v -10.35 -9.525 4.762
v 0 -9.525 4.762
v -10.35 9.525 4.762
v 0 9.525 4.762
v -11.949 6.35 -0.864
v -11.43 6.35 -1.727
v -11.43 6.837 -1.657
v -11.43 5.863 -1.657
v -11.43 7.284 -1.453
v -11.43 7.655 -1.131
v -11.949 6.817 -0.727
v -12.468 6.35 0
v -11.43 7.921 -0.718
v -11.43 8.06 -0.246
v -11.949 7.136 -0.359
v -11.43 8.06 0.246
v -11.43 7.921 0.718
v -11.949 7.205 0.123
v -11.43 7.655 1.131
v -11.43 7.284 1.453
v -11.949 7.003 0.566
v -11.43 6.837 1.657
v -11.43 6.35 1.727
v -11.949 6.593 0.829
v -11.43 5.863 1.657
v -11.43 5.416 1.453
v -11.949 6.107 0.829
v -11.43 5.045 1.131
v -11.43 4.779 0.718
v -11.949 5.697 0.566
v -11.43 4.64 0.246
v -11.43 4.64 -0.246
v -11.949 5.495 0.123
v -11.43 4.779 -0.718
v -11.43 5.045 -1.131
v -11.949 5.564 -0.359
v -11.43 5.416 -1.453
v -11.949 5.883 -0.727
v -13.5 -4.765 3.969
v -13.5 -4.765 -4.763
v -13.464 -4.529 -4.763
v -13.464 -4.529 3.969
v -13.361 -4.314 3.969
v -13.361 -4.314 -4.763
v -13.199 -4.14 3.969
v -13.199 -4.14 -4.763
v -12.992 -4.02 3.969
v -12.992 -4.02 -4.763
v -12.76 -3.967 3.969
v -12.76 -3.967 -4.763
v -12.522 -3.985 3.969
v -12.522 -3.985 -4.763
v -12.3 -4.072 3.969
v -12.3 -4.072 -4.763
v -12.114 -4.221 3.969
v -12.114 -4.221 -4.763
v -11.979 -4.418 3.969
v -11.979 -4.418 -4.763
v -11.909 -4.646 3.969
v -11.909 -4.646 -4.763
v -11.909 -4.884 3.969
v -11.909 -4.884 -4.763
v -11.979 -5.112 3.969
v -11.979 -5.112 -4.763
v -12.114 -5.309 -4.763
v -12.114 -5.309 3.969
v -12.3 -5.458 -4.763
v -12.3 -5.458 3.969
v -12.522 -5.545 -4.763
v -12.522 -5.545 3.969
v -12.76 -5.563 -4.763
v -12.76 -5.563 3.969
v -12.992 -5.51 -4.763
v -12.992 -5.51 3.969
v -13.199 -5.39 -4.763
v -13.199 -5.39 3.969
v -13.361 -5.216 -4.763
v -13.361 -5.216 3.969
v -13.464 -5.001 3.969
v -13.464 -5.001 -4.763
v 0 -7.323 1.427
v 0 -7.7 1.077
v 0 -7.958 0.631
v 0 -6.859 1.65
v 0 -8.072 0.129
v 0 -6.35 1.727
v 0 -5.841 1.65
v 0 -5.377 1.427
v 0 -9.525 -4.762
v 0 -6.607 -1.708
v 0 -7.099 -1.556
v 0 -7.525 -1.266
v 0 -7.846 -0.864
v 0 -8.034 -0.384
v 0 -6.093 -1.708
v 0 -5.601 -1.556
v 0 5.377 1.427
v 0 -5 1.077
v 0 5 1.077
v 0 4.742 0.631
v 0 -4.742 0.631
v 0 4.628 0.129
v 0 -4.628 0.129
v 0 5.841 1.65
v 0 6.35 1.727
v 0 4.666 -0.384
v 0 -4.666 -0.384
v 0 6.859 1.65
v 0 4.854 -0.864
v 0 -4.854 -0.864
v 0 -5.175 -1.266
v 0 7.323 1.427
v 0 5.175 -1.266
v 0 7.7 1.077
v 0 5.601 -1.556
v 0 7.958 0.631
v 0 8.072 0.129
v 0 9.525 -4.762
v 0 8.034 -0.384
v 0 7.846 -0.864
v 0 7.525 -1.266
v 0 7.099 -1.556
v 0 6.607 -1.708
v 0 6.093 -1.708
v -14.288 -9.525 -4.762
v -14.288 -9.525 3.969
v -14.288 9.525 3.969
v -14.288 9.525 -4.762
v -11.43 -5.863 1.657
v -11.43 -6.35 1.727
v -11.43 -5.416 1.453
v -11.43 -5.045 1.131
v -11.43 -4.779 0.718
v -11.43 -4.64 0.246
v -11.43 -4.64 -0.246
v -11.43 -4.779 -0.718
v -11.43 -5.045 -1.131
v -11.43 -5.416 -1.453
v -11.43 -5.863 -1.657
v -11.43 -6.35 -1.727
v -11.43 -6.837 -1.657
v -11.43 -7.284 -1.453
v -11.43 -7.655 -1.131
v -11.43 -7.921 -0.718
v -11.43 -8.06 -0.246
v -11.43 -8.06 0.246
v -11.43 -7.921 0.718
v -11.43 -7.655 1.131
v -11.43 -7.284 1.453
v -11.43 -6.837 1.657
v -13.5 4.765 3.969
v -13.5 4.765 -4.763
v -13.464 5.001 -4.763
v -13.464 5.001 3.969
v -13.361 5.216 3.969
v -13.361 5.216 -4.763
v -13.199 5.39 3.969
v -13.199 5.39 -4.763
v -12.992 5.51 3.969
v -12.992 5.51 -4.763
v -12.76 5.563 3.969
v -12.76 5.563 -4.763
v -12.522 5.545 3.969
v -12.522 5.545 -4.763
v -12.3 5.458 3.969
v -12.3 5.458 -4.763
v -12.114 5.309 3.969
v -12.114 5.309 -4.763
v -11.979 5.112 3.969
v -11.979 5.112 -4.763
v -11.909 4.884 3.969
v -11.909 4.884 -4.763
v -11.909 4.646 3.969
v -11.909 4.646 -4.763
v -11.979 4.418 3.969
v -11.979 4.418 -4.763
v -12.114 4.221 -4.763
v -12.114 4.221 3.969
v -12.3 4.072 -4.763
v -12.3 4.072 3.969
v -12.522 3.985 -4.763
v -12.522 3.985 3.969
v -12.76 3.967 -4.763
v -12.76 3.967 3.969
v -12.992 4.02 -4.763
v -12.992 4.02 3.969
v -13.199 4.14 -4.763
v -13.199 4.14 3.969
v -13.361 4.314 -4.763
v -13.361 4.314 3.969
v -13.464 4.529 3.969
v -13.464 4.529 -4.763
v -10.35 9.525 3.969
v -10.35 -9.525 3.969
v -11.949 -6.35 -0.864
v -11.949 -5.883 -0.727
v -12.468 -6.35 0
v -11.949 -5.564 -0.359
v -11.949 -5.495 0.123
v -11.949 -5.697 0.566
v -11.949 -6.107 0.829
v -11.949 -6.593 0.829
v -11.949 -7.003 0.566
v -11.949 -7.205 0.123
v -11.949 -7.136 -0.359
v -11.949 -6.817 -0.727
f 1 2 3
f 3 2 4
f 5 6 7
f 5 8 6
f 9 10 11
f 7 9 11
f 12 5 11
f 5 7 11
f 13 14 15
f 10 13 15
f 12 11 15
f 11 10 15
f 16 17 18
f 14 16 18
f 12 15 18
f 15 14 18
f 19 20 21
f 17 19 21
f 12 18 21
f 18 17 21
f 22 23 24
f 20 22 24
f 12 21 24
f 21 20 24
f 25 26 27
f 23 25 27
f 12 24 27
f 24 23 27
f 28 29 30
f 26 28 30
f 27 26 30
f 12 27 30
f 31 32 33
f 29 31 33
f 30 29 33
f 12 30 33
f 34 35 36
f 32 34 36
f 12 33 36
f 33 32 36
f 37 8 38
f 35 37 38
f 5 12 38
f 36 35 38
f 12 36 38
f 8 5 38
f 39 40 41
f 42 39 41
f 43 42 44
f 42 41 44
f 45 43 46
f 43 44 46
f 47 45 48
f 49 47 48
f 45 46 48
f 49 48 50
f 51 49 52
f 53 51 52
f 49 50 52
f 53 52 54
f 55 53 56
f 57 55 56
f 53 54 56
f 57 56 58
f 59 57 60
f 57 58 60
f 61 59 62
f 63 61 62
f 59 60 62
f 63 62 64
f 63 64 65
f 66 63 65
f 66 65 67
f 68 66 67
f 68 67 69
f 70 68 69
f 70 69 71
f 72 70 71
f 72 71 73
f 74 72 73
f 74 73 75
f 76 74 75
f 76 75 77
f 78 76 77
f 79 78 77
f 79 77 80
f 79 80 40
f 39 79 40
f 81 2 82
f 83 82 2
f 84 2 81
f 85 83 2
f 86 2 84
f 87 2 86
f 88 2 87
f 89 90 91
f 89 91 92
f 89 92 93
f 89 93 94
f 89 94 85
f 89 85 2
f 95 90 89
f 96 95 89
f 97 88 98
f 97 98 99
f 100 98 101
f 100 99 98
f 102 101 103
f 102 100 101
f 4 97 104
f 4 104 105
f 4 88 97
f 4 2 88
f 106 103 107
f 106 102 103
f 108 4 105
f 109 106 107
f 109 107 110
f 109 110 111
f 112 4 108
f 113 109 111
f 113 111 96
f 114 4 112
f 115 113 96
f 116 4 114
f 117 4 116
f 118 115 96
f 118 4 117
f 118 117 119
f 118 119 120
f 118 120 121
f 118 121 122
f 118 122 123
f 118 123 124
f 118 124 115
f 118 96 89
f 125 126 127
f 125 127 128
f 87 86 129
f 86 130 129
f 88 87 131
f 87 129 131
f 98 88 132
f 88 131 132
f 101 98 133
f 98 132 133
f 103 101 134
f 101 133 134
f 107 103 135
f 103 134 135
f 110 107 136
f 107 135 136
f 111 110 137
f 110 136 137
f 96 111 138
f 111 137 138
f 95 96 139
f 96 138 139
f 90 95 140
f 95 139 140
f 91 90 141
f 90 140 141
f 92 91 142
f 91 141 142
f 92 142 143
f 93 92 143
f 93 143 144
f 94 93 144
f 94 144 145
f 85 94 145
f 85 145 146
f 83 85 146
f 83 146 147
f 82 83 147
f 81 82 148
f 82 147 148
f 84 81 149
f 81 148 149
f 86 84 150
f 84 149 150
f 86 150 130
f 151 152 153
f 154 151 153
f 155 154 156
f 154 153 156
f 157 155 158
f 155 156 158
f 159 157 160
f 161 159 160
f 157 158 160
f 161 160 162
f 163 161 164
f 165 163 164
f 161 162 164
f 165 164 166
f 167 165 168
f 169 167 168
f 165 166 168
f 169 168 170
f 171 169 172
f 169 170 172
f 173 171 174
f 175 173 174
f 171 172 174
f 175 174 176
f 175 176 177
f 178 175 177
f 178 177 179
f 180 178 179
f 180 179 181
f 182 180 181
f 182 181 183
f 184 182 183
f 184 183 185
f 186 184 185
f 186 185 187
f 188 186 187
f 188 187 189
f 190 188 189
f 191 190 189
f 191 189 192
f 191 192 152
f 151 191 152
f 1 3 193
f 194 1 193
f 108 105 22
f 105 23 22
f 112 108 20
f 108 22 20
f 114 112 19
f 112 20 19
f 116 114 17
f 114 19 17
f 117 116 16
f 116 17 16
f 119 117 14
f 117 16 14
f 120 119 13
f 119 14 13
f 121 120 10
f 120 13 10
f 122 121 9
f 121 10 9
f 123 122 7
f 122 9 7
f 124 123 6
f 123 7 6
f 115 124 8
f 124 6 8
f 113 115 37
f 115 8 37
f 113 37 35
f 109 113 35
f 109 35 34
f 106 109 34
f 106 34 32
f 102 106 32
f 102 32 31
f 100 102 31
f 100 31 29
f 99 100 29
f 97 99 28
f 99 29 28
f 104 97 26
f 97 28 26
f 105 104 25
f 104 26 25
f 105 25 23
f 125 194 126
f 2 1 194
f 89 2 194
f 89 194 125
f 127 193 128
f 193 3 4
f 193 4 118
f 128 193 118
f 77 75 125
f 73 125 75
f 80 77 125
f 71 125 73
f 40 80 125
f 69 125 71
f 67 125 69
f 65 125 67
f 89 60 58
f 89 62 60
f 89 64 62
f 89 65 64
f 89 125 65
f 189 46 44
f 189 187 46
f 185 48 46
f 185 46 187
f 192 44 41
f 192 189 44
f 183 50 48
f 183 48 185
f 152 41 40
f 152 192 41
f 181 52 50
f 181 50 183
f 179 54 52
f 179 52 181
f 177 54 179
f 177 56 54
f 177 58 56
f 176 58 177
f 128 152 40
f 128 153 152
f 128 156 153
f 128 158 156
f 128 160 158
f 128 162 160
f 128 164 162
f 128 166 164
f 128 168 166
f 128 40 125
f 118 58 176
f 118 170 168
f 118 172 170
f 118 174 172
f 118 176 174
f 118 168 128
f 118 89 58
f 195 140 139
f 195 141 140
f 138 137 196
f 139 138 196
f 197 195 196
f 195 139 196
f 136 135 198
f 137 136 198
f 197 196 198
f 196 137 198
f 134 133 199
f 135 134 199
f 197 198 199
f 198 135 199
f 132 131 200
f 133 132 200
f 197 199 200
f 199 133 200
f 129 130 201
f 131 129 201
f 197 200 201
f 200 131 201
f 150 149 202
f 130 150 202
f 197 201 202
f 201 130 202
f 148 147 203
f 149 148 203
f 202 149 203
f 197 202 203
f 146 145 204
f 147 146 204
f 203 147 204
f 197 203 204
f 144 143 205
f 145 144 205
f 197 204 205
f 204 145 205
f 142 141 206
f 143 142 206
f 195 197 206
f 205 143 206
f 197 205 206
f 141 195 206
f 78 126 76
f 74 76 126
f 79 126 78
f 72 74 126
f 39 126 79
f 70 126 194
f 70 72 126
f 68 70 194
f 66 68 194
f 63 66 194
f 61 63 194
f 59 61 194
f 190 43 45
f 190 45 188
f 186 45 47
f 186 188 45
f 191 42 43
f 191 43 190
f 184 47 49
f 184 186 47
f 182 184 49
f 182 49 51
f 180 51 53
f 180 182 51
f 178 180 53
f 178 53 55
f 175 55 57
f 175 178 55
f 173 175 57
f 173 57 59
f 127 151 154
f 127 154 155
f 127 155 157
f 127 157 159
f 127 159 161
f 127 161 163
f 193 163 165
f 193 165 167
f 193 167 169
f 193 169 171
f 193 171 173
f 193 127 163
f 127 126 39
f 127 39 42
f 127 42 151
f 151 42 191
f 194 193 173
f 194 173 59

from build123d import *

# Parameters (mm, degrees)
SKETCH1_W                 = 9.525
SKETCH1_H                 = 19.05
BOSS_EXTRUDE1_DEPTH       = 14.2875
F_8_32_TAPPED_HOLE1_D     = 3.4544
F_8_32_TAPPED_HOLE1_DEPTH = 11.43
F_8_32_TAPPED_HOLE1_TIP   = 1.037806461
SKETCH4_W                 = 3.937500126
SKETCH4_H                 = 0.79375
CUT_EXTRUDE1_DEPTH        = 25.284080433
M2X0_4_TAPPED_HOLE1_D     = 1.6


with BuildPart() as part:
    # Sketch1 → Boss-Extrude1 (new body)
    with BuildSketch(Plane(origin=(0, 0, 0), x_dir=(0, 0, -1), z_dir=(1, 0, 0))):
        Rectangle(SKETCH1_W, SKETCH1_H)
    extrude(amount=-BOSS_EXTRUDE1_DEPTH)

    # #8-32 Tapped Hole1
    with Locations(Plane(origin=(0, 0, 0), x_dir=(0, 0, -1), z_dir=(1, 0, 0))):
        with Locations((0, 6.35), (0, -6.35)):
            Hole(F_8_32_TAPPED_HOLE1_D / 2, depth=F_8_32_TAPPED_HOLE1_DEPTH)
            with Locations((0, 0, -(F_8_32_TAPPED_HOLE1_DEPTH + F_8_32_TAPPED_HOLE1_TIP / 2))):  # 118° drill point
                Cone(0, F_8_32_TAPPED_HOLE1_D / 2, F_8_32_TAPPED_HOLE1_TIP, mode=Mode.SUBTRACT)

    # Sketch4 → Cut-Extrude1 (cut, through all)
    with BuildSketch(Plane(origin=(0, 9.525, 0), x_dir=(1, 0, 0), z_dir=(0, 1, 0))):
        with Locations((-12.318749937, -4.365625)):
            Rectangle(SKETCH4_W, SKETCH4_H)
    extrude(amount=-CUT_EXTRUDE1_DEPTH, mode=Mode.SUBTRACT)

    # M2x0.4 Tapped Hole1 (through all)
    with Locations(Plane.XY.offset(3.96875)):
        with Locations((-12.7, -4.764999995), (-12.7, 4.764999995)):
            Hole(M2X0_4_TAPPED_HOLE1_D / 2)


solid = part.part
